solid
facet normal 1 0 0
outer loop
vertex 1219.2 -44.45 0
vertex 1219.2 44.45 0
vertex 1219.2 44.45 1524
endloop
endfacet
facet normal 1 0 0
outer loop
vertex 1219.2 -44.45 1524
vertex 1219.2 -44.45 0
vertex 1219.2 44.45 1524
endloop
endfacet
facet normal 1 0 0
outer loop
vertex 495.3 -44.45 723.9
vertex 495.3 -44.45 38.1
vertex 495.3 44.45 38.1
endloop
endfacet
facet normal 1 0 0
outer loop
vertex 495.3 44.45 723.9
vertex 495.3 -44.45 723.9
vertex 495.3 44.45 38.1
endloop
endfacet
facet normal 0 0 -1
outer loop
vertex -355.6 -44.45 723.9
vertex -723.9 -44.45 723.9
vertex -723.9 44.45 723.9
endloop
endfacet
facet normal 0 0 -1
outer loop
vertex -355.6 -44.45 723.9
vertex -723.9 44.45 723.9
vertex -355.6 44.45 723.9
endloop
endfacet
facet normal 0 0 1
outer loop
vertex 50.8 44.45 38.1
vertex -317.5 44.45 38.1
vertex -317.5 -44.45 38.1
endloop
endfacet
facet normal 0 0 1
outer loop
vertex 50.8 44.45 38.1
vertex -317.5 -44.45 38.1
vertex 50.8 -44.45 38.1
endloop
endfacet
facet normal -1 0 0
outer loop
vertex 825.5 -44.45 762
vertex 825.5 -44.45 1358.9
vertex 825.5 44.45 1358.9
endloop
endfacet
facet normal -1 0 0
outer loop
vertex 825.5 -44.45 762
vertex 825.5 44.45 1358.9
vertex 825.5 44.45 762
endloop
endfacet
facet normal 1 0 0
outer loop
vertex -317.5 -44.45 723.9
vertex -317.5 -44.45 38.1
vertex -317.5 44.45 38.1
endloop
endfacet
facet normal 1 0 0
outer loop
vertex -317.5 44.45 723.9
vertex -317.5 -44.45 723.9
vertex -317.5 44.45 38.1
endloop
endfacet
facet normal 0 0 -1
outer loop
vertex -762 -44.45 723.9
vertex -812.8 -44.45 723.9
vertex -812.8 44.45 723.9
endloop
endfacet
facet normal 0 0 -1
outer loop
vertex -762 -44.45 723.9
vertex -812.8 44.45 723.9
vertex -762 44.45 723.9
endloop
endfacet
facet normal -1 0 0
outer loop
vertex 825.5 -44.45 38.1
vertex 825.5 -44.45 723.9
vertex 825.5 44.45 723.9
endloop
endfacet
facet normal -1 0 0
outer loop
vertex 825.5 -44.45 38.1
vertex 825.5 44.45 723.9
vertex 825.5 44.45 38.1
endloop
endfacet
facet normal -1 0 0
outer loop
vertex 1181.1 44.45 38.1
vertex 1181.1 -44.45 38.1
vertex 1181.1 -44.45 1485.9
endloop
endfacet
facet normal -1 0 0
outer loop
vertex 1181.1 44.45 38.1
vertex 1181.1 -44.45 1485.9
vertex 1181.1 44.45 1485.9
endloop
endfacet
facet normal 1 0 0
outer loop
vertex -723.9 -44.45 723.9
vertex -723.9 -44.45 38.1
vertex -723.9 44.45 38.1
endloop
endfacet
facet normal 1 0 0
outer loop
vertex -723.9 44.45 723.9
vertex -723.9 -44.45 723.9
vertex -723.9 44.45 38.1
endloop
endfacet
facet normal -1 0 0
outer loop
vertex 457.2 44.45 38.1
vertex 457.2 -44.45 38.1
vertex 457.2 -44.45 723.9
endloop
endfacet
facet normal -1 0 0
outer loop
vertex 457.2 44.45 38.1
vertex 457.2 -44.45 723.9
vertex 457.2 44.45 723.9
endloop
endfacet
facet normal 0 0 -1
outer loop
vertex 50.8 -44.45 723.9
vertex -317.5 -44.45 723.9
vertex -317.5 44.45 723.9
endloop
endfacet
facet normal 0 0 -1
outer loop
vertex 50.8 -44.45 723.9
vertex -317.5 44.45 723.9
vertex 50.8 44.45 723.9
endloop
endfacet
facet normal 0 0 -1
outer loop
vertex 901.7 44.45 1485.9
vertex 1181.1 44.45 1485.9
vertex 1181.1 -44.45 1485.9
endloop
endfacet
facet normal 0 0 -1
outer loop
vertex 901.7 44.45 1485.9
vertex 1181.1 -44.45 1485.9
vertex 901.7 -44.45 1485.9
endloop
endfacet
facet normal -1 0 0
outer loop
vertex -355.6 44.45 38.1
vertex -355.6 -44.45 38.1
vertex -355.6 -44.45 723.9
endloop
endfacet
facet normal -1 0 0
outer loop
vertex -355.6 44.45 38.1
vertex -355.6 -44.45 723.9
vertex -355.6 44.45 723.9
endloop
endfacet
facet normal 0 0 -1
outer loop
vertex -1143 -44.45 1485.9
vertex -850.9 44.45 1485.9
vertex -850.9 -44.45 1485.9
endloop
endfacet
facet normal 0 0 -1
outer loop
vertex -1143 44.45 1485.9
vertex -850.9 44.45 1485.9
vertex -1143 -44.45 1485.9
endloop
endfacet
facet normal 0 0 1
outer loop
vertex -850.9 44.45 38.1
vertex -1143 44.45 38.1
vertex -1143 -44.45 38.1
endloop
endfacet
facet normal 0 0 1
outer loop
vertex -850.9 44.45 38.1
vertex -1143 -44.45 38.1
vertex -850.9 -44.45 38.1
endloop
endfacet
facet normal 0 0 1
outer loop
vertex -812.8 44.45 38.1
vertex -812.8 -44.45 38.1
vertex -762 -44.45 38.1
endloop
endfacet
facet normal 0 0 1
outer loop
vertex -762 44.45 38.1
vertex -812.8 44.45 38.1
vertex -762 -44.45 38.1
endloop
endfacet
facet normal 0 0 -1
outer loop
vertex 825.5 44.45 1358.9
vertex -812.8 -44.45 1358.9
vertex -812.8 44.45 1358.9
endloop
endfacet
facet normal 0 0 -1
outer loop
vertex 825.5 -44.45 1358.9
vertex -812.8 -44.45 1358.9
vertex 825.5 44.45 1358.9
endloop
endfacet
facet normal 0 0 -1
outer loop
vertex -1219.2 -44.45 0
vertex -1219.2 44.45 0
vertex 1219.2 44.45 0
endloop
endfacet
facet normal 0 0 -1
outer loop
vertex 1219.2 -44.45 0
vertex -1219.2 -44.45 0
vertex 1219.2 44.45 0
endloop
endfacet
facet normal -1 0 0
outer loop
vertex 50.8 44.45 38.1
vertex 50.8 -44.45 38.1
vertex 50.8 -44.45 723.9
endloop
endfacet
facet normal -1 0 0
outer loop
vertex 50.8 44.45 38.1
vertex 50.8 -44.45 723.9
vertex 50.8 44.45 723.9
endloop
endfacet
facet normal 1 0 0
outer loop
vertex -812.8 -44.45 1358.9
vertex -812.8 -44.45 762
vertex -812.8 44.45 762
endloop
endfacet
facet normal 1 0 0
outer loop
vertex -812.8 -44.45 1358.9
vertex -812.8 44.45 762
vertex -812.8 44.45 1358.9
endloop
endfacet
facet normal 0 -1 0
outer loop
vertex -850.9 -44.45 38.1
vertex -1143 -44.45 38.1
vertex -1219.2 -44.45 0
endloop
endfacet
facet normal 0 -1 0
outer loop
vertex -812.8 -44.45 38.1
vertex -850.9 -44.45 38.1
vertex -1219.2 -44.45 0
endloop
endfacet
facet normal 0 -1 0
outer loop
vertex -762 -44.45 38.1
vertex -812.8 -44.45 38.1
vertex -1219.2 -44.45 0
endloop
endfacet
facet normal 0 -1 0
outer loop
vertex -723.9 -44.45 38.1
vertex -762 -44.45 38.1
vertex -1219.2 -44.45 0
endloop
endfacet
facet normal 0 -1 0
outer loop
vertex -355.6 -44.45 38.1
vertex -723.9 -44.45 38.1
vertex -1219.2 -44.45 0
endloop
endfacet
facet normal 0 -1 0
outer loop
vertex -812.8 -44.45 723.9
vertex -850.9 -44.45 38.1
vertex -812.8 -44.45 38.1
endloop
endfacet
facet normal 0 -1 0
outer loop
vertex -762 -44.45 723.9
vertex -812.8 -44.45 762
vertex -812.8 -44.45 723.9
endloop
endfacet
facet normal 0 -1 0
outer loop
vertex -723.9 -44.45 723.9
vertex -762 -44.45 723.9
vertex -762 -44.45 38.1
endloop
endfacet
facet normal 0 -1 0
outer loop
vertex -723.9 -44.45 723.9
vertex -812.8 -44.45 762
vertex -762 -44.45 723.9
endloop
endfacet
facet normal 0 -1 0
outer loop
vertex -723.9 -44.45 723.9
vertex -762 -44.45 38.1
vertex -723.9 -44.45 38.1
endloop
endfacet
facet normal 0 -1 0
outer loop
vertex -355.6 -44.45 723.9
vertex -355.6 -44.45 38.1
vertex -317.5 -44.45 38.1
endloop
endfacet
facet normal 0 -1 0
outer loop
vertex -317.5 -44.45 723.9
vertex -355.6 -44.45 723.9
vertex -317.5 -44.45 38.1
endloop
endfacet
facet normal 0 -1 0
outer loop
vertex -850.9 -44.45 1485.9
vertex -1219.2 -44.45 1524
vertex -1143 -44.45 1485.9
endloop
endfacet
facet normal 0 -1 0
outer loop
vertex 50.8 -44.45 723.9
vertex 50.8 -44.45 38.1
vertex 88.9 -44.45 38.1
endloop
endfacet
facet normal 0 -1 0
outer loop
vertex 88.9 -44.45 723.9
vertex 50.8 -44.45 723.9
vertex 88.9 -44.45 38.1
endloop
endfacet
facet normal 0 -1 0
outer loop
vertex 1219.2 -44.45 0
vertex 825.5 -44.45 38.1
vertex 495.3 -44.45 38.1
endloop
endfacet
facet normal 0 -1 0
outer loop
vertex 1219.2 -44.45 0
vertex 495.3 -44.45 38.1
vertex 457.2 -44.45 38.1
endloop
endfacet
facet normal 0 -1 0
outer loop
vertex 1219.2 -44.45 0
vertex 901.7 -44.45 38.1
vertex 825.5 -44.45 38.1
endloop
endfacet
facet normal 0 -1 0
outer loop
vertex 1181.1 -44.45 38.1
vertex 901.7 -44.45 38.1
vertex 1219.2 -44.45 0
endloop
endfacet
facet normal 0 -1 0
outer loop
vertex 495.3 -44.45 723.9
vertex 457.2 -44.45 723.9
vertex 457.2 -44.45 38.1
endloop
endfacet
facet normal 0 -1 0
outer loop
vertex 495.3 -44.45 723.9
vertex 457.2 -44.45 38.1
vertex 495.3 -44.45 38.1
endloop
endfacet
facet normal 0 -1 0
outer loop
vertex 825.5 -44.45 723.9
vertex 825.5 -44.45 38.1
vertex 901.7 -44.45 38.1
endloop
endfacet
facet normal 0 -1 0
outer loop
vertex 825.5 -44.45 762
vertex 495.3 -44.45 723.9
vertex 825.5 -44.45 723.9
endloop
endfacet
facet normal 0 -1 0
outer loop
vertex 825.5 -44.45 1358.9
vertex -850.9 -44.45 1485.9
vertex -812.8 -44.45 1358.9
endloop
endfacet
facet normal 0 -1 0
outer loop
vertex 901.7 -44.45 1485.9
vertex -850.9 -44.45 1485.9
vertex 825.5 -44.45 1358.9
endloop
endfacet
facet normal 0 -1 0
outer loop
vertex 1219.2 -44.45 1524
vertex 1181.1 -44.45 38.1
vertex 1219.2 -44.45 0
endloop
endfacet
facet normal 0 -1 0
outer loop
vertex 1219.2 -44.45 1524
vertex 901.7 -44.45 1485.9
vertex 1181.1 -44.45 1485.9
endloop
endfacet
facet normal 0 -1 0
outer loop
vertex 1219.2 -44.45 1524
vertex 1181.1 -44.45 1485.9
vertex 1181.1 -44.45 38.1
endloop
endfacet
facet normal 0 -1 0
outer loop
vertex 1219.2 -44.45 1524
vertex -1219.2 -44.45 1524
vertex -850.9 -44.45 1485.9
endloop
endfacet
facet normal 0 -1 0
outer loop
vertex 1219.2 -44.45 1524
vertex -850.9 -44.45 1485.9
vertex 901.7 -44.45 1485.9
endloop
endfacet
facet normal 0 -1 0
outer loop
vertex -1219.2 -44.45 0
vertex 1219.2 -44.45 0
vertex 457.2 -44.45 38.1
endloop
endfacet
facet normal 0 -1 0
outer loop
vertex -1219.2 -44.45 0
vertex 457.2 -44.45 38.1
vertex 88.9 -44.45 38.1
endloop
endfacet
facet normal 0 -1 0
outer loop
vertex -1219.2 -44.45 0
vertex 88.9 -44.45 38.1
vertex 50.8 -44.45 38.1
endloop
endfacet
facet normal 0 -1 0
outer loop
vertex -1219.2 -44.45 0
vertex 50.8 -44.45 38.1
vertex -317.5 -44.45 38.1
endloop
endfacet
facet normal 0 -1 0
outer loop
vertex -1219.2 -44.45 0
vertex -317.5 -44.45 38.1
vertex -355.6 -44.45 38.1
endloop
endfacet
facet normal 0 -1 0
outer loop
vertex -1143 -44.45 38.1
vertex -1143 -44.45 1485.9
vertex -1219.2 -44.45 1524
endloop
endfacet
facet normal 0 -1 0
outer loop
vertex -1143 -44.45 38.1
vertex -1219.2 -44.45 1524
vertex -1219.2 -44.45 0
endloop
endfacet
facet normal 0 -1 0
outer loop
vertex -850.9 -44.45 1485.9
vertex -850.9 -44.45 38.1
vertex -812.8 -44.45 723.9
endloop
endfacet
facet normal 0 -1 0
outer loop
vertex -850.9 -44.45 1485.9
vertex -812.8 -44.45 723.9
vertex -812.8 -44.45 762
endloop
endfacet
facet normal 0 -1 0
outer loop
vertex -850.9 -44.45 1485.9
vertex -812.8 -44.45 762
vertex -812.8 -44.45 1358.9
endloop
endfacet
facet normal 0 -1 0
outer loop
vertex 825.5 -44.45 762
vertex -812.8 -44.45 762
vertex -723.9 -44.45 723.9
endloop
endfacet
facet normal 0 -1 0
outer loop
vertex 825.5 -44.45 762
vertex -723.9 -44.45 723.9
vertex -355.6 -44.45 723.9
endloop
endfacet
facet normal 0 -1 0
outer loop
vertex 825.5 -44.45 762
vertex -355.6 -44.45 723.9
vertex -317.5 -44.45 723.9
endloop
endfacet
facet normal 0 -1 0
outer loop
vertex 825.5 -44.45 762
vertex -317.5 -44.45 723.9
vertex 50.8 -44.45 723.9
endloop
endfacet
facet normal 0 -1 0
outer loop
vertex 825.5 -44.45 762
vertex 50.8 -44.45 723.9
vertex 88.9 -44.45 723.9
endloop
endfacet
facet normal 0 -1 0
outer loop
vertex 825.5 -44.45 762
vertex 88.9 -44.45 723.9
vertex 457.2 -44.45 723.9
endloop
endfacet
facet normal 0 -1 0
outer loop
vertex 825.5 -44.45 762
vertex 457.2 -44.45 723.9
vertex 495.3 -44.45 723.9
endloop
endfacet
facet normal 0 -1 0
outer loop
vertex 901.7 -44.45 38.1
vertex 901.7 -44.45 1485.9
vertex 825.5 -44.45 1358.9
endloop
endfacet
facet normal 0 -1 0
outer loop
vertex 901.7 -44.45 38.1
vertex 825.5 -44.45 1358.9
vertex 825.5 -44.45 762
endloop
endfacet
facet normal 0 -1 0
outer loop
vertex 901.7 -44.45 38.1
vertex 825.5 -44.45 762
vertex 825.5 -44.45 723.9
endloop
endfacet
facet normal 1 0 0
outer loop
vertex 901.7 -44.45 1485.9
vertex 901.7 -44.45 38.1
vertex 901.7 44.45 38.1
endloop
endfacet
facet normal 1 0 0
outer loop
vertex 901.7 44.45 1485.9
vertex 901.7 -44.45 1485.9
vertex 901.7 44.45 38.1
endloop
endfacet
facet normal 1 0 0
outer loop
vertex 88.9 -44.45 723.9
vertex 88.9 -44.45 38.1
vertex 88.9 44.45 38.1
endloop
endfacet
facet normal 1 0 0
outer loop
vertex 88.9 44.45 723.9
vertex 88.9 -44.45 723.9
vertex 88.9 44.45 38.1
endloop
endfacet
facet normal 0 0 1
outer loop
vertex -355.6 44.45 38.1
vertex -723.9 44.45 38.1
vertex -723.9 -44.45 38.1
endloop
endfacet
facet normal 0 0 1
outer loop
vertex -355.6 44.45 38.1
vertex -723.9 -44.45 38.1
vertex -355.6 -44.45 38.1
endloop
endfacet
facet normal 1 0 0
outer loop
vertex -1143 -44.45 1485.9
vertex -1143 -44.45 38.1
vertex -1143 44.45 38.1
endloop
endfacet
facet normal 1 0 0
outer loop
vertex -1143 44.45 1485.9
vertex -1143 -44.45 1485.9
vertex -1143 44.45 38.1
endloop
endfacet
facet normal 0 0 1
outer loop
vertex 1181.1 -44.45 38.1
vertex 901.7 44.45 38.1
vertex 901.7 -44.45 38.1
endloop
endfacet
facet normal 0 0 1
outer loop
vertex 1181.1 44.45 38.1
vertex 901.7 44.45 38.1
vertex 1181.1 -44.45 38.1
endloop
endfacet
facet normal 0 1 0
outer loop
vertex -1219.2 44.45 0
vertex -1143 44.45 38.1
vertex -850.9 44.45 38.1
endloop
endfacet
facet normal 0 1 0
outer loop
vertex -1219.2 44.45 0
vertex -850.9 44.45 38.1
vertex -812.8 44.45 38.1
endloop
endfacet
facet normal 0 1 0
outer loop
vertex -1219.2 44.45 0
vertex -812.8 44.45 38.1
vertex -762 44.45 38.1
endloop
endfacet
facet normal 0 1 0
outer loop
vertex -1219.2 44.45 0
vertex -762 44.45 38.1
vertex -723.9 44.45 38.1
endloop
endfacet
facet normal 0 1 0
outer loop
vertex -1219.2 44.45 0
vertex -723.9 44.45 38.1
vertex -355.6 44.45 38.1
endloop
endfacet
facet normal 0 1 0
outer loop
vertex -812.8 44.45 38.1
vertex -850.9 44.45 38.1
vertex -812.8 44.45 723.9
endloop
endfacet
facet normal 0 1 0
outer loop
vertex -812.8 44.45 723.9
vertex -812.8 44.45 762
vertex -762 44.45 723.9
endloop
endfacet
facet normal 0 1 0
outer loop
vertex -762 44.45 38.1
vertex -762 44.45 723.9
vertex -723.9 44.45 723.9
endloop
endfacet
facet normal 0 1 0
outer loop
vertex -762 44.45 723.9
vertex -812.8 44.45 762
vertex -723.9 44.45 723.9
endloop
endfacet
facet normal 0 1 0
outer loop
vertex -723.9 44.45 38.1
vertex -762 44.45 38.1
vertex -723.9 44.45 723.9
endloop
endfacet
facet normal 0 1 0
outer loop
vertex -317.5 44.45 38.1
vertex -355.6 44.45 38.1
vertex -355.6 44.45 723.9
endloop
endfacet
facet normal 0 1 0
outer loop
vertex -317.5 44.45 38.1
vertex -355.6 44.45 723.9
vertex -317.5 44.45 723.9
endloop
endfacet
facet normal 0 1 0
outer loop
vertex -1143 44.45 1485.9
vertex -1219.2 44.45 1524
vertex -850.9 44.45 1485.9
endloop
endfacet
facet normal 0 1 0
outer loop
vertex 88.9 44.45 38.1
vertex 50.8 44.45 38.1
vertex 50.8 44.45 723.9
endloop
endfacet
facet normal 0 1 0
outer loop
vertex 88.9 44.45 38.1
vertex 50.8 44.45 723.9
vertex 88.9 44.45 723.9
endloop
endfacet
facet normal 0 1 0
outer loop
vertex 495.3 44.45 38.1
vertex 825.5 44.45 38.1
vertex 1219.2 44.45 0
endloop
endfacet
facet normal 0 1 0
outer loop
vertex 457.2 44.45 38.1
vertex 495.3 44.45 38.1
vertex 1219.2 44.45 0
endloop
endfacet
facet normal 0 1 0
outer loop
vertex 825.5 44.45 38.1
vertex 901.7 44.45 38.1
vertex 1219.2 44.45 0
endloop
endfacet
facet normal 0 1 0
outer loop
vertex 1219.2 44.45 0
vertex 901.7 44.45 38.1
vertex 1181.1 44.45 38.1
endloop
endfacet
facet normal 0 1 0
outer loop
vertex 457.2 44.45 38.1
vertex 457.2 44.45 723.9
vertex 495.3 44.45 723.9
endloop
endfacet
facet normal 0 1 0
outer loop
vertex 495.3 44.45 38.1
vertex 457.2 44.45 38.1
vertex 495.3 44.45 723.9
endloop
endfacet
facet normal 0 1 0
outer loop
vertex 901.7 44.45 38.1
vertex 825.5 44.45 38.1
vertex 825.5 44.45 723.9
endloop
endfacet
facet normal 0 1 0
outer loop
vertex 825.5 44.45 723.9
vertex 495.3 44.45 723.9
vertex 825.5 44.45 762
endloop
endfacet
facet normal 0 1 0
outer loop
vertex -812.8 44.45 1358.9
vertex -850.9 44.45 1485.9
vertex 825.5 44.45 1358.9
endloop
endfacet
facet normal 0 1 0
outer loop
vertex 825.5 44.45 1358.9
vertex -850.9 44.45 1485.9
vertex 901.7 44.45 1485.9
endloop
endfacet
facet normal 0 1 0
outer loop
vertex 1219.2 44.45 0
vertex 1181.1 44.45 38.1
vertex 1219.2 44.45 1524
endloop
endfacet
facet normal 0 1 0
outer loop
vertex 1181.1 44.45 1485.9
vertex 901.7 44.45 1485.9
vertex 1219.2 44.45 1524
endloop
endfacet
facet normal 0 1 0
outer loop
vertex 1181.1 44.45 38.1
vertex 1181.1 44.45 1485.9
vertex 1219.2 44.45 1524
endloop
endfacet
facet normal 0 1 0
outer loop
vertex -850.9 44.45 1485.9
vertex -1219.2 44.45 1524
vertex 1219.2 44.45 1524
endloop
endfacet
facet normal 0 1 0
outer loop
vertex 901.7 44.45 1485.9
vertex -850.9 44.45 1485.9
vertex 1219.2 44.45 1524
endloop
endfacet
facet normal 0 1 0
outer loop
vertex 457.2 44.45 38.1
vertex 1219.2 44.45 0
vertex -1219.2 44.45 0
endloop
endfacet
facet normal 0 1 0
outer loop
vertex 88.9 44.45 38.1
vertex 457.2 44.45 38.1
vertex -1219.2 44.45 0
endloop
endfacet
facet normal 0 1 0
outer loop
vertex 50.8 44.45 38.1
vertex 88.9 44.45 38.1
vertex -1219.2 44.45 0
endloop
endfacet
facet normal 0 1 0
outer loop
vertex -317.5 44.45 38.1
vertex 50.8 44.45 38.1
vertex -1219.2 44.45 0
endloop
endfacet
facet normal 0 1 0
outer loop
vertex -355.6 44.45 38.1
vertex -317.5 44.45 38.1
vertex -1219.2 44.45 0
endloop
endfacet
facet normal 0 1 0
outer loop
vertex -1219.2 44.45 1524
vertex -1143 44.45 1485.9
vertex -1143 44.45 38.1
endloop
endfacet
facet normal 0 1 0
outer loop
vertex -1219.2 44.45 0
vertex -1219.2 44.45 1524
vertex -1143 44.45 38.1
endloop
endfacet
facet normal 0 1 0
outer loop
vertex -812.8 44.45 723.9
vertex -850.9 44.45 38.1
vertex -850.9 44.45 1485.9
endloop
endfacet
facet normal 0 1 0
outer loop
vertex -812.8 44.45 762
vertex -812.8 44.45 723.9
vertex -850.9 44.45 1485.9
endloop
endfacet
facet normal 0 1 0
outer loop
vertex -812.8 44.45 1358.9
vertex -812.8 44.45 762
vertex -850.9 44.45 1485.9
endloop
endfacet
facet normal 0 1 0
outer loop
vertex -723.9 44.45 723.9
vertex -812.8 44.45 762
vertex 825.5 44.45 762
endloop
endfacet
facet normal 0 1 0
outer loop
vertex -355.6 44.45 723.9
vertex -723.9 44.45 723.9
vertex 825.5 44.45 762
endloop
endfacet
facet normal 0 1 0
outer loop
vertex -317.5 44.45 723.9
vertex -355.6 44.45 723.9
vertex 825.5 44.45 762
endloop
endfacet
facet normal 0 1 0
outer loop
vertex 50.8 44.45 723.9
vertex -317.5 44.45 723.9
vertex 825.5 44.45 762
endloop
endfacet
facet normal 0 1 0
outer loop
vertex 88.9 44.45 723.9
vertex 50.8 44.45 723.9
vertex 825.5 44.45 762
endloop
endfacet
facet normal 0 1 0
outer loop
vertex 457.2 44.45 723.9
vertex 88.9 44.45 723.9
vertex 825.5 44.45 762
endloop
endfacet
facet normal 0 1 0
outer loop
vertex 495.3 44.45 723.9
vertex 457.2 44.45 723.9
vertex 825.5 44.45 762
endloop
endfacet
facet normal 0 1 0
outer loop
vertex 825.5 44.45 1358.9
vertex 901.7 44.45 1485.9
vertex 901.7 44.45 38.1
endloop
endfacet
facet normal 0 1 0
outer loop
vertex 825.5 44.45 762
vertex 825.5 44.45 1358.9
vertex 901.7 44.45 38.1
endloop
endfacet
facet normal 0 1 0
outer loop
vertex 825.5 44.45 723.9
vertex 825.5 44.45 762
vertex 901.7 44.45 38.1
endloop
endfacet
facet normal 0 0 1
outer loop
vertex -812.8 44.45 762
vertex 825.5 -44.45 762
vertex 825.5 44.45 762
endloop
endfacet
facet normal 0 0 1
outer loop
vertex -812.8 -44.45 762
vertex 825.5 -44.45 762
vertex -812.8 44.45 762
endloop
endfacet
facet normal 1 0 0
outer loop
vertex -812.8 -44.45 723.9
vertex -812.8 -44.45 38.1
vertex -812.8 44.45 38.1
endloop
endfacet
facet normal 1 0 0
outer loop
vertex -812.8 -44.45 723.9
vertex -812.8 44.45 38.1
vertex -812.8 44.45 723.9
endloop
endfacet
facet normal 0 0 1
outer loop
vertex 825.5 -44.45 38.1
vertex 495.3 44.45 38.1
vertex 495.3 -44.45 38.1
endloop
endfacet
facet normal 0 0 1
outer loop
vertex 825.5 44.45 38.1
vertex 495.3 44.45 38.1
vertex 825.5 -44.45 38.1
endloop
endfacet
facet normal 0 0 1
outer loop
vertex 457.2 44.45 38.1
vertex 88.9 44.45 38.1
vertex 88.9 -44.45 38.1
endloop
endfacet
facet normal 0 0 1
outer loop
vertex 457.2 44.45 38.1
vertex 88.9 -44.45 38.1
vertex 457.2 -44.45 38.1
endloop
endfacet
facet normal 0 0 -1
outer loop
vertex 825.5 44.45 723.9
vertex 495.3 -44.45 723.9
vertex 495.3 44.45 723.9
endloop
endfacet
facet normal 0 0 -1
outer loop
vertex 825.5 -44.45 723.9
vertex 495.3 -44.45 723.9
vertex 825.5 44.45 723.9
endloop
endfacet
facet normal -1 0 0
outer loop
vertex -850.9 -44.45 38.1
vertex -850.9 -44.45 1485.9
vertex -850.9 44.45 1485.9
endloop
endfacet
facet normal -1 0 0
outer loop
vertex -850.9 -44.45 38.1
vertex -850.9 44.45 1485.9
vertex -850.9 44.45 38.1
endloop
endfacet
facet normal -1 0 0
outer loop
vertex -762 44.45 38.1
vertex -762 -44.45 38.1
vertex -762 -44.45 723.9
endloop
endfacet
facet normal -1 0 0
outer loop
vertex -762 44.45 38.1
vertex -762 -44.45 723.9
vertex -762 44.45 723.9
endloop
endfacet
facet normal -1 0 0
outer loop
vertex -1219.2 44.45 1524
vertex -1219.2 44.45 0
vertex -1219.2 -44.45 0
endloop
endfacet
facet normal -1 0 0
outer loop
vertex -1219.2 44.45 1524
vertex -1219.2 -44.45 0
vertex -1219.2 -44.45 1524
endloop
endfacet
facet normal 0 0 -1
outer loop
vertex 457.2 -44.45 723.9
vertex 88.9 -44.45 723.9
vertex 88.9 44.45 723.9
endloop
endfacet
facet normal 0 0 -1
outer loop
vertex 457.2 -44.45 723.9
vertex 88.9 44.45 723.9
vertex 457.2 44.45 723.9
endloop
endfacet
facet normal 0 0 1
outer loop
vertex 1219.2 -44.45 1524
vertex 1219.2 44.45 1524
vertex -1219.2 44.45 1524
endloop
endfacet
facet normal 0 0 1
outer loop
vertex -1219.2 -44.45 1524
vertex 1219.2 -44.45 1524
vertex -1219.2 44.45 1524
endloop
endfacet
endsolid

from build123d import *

# Parameters (mm, degrees)
F0_W     = 2438.4
F0_H     = 88.9
F1_DEPTH = 38.1
F2_W     = 38.1
F2_H     = 88.9
F3_DEPTH = 1447.8
F4_W     = 2438.4
F4_H     = 38.1
F5_DEPTH = 88.9
F7_DEPTH = 88.9
F8_W     = 1638.3
F8_H     = 596.9
F9_DEPTH = 215.9


with BuildPart() as f1:
    # F0 (on Top) → F1 (new body)
    with BuildSketch(Plane.XY):
        Rectangle(F0_W, F0_H)
    extrude(amount=F1_DEPTH)

    # F2 (on face) → F3 (join)
    with BuildSketch(Plane.XY.offset(38.1)):
        with Locations((1200.15, 0)):
            Rectangle(F2_W, F2_H)
        with Locations((882.65, 0)):
            Rectangle(F2_W, F2_H)
        with Locations((476.25, 0)):
            Rectangle(F2_W, F2_H)
        with Locations((69.85, 0)):
            Rectangle(F2_W, F2_H)
        with Locations((-336.55, 0)):
            Rectangle(F2_W, F2_H)
        with Locations((-742.95, 0)):
            Rectangle(F2_W, F2_H)
        with Locations((-1200.15, 0)):
            Rectangle(F2_W, F2_H)
        with Locations((-1162.05, 0)):
            Rectangle(F2_W, F2_H)
    extrude(amount=F3_DEPTH)

    # F4 (on face) → F5 (join)
    with BuildSketch(Plane(origin=(0, 44.45, 0), x_dir=(-1, 0, 0), z_dir=(0, 1, 0))):
        with Locations((0, 1504.95)):
            Rectangle(F4_W, F4_H)
    extrude(amount=-F5_DEPTH)

    # F6 (on face) → F7 (join)
    with BuildSketch(Plane.XZ.offset(44.45)):
        Polygon((825.5, 762), (812.8, 762), (-812.8, 762), (-812.8, 723.9), (825.5, 723.9), align=None)
        Polygon((-812.8, 723.9), (-812.8, 762), (-812.8, 1358.9), (-812.8, 1485.9), (-850.9, 1485.9), (-850.9, 38.1), (-812.8, 38.1), align=None)
        Polygon((-812.8, 1358.9), (812.8, 1358.9), (825.5, 1358.9), (825.5, 1485.9), (-812.8, 1485.9), align=None)
        Polygon((825.5, 1358.9), (825.5, 762), (825.5, 723.9), (825.5, 38.1), (863.6, 38.1), (863.6, 1485.9), (825.5, 1485.9), align=None)
    extrude(amount=-F7_DEPTH)

    # F8 (on face) → F9 (cut)
    with BuildSketch(Plane.XZ.offset(44.45)):
        with Locations((6.35, 1060.45)):
            Rectangle(F8_W, F8_H)
    extrude(amount=-F9_DEPTH, mode=Mode.SUBTRACT)


solid = f1.part
